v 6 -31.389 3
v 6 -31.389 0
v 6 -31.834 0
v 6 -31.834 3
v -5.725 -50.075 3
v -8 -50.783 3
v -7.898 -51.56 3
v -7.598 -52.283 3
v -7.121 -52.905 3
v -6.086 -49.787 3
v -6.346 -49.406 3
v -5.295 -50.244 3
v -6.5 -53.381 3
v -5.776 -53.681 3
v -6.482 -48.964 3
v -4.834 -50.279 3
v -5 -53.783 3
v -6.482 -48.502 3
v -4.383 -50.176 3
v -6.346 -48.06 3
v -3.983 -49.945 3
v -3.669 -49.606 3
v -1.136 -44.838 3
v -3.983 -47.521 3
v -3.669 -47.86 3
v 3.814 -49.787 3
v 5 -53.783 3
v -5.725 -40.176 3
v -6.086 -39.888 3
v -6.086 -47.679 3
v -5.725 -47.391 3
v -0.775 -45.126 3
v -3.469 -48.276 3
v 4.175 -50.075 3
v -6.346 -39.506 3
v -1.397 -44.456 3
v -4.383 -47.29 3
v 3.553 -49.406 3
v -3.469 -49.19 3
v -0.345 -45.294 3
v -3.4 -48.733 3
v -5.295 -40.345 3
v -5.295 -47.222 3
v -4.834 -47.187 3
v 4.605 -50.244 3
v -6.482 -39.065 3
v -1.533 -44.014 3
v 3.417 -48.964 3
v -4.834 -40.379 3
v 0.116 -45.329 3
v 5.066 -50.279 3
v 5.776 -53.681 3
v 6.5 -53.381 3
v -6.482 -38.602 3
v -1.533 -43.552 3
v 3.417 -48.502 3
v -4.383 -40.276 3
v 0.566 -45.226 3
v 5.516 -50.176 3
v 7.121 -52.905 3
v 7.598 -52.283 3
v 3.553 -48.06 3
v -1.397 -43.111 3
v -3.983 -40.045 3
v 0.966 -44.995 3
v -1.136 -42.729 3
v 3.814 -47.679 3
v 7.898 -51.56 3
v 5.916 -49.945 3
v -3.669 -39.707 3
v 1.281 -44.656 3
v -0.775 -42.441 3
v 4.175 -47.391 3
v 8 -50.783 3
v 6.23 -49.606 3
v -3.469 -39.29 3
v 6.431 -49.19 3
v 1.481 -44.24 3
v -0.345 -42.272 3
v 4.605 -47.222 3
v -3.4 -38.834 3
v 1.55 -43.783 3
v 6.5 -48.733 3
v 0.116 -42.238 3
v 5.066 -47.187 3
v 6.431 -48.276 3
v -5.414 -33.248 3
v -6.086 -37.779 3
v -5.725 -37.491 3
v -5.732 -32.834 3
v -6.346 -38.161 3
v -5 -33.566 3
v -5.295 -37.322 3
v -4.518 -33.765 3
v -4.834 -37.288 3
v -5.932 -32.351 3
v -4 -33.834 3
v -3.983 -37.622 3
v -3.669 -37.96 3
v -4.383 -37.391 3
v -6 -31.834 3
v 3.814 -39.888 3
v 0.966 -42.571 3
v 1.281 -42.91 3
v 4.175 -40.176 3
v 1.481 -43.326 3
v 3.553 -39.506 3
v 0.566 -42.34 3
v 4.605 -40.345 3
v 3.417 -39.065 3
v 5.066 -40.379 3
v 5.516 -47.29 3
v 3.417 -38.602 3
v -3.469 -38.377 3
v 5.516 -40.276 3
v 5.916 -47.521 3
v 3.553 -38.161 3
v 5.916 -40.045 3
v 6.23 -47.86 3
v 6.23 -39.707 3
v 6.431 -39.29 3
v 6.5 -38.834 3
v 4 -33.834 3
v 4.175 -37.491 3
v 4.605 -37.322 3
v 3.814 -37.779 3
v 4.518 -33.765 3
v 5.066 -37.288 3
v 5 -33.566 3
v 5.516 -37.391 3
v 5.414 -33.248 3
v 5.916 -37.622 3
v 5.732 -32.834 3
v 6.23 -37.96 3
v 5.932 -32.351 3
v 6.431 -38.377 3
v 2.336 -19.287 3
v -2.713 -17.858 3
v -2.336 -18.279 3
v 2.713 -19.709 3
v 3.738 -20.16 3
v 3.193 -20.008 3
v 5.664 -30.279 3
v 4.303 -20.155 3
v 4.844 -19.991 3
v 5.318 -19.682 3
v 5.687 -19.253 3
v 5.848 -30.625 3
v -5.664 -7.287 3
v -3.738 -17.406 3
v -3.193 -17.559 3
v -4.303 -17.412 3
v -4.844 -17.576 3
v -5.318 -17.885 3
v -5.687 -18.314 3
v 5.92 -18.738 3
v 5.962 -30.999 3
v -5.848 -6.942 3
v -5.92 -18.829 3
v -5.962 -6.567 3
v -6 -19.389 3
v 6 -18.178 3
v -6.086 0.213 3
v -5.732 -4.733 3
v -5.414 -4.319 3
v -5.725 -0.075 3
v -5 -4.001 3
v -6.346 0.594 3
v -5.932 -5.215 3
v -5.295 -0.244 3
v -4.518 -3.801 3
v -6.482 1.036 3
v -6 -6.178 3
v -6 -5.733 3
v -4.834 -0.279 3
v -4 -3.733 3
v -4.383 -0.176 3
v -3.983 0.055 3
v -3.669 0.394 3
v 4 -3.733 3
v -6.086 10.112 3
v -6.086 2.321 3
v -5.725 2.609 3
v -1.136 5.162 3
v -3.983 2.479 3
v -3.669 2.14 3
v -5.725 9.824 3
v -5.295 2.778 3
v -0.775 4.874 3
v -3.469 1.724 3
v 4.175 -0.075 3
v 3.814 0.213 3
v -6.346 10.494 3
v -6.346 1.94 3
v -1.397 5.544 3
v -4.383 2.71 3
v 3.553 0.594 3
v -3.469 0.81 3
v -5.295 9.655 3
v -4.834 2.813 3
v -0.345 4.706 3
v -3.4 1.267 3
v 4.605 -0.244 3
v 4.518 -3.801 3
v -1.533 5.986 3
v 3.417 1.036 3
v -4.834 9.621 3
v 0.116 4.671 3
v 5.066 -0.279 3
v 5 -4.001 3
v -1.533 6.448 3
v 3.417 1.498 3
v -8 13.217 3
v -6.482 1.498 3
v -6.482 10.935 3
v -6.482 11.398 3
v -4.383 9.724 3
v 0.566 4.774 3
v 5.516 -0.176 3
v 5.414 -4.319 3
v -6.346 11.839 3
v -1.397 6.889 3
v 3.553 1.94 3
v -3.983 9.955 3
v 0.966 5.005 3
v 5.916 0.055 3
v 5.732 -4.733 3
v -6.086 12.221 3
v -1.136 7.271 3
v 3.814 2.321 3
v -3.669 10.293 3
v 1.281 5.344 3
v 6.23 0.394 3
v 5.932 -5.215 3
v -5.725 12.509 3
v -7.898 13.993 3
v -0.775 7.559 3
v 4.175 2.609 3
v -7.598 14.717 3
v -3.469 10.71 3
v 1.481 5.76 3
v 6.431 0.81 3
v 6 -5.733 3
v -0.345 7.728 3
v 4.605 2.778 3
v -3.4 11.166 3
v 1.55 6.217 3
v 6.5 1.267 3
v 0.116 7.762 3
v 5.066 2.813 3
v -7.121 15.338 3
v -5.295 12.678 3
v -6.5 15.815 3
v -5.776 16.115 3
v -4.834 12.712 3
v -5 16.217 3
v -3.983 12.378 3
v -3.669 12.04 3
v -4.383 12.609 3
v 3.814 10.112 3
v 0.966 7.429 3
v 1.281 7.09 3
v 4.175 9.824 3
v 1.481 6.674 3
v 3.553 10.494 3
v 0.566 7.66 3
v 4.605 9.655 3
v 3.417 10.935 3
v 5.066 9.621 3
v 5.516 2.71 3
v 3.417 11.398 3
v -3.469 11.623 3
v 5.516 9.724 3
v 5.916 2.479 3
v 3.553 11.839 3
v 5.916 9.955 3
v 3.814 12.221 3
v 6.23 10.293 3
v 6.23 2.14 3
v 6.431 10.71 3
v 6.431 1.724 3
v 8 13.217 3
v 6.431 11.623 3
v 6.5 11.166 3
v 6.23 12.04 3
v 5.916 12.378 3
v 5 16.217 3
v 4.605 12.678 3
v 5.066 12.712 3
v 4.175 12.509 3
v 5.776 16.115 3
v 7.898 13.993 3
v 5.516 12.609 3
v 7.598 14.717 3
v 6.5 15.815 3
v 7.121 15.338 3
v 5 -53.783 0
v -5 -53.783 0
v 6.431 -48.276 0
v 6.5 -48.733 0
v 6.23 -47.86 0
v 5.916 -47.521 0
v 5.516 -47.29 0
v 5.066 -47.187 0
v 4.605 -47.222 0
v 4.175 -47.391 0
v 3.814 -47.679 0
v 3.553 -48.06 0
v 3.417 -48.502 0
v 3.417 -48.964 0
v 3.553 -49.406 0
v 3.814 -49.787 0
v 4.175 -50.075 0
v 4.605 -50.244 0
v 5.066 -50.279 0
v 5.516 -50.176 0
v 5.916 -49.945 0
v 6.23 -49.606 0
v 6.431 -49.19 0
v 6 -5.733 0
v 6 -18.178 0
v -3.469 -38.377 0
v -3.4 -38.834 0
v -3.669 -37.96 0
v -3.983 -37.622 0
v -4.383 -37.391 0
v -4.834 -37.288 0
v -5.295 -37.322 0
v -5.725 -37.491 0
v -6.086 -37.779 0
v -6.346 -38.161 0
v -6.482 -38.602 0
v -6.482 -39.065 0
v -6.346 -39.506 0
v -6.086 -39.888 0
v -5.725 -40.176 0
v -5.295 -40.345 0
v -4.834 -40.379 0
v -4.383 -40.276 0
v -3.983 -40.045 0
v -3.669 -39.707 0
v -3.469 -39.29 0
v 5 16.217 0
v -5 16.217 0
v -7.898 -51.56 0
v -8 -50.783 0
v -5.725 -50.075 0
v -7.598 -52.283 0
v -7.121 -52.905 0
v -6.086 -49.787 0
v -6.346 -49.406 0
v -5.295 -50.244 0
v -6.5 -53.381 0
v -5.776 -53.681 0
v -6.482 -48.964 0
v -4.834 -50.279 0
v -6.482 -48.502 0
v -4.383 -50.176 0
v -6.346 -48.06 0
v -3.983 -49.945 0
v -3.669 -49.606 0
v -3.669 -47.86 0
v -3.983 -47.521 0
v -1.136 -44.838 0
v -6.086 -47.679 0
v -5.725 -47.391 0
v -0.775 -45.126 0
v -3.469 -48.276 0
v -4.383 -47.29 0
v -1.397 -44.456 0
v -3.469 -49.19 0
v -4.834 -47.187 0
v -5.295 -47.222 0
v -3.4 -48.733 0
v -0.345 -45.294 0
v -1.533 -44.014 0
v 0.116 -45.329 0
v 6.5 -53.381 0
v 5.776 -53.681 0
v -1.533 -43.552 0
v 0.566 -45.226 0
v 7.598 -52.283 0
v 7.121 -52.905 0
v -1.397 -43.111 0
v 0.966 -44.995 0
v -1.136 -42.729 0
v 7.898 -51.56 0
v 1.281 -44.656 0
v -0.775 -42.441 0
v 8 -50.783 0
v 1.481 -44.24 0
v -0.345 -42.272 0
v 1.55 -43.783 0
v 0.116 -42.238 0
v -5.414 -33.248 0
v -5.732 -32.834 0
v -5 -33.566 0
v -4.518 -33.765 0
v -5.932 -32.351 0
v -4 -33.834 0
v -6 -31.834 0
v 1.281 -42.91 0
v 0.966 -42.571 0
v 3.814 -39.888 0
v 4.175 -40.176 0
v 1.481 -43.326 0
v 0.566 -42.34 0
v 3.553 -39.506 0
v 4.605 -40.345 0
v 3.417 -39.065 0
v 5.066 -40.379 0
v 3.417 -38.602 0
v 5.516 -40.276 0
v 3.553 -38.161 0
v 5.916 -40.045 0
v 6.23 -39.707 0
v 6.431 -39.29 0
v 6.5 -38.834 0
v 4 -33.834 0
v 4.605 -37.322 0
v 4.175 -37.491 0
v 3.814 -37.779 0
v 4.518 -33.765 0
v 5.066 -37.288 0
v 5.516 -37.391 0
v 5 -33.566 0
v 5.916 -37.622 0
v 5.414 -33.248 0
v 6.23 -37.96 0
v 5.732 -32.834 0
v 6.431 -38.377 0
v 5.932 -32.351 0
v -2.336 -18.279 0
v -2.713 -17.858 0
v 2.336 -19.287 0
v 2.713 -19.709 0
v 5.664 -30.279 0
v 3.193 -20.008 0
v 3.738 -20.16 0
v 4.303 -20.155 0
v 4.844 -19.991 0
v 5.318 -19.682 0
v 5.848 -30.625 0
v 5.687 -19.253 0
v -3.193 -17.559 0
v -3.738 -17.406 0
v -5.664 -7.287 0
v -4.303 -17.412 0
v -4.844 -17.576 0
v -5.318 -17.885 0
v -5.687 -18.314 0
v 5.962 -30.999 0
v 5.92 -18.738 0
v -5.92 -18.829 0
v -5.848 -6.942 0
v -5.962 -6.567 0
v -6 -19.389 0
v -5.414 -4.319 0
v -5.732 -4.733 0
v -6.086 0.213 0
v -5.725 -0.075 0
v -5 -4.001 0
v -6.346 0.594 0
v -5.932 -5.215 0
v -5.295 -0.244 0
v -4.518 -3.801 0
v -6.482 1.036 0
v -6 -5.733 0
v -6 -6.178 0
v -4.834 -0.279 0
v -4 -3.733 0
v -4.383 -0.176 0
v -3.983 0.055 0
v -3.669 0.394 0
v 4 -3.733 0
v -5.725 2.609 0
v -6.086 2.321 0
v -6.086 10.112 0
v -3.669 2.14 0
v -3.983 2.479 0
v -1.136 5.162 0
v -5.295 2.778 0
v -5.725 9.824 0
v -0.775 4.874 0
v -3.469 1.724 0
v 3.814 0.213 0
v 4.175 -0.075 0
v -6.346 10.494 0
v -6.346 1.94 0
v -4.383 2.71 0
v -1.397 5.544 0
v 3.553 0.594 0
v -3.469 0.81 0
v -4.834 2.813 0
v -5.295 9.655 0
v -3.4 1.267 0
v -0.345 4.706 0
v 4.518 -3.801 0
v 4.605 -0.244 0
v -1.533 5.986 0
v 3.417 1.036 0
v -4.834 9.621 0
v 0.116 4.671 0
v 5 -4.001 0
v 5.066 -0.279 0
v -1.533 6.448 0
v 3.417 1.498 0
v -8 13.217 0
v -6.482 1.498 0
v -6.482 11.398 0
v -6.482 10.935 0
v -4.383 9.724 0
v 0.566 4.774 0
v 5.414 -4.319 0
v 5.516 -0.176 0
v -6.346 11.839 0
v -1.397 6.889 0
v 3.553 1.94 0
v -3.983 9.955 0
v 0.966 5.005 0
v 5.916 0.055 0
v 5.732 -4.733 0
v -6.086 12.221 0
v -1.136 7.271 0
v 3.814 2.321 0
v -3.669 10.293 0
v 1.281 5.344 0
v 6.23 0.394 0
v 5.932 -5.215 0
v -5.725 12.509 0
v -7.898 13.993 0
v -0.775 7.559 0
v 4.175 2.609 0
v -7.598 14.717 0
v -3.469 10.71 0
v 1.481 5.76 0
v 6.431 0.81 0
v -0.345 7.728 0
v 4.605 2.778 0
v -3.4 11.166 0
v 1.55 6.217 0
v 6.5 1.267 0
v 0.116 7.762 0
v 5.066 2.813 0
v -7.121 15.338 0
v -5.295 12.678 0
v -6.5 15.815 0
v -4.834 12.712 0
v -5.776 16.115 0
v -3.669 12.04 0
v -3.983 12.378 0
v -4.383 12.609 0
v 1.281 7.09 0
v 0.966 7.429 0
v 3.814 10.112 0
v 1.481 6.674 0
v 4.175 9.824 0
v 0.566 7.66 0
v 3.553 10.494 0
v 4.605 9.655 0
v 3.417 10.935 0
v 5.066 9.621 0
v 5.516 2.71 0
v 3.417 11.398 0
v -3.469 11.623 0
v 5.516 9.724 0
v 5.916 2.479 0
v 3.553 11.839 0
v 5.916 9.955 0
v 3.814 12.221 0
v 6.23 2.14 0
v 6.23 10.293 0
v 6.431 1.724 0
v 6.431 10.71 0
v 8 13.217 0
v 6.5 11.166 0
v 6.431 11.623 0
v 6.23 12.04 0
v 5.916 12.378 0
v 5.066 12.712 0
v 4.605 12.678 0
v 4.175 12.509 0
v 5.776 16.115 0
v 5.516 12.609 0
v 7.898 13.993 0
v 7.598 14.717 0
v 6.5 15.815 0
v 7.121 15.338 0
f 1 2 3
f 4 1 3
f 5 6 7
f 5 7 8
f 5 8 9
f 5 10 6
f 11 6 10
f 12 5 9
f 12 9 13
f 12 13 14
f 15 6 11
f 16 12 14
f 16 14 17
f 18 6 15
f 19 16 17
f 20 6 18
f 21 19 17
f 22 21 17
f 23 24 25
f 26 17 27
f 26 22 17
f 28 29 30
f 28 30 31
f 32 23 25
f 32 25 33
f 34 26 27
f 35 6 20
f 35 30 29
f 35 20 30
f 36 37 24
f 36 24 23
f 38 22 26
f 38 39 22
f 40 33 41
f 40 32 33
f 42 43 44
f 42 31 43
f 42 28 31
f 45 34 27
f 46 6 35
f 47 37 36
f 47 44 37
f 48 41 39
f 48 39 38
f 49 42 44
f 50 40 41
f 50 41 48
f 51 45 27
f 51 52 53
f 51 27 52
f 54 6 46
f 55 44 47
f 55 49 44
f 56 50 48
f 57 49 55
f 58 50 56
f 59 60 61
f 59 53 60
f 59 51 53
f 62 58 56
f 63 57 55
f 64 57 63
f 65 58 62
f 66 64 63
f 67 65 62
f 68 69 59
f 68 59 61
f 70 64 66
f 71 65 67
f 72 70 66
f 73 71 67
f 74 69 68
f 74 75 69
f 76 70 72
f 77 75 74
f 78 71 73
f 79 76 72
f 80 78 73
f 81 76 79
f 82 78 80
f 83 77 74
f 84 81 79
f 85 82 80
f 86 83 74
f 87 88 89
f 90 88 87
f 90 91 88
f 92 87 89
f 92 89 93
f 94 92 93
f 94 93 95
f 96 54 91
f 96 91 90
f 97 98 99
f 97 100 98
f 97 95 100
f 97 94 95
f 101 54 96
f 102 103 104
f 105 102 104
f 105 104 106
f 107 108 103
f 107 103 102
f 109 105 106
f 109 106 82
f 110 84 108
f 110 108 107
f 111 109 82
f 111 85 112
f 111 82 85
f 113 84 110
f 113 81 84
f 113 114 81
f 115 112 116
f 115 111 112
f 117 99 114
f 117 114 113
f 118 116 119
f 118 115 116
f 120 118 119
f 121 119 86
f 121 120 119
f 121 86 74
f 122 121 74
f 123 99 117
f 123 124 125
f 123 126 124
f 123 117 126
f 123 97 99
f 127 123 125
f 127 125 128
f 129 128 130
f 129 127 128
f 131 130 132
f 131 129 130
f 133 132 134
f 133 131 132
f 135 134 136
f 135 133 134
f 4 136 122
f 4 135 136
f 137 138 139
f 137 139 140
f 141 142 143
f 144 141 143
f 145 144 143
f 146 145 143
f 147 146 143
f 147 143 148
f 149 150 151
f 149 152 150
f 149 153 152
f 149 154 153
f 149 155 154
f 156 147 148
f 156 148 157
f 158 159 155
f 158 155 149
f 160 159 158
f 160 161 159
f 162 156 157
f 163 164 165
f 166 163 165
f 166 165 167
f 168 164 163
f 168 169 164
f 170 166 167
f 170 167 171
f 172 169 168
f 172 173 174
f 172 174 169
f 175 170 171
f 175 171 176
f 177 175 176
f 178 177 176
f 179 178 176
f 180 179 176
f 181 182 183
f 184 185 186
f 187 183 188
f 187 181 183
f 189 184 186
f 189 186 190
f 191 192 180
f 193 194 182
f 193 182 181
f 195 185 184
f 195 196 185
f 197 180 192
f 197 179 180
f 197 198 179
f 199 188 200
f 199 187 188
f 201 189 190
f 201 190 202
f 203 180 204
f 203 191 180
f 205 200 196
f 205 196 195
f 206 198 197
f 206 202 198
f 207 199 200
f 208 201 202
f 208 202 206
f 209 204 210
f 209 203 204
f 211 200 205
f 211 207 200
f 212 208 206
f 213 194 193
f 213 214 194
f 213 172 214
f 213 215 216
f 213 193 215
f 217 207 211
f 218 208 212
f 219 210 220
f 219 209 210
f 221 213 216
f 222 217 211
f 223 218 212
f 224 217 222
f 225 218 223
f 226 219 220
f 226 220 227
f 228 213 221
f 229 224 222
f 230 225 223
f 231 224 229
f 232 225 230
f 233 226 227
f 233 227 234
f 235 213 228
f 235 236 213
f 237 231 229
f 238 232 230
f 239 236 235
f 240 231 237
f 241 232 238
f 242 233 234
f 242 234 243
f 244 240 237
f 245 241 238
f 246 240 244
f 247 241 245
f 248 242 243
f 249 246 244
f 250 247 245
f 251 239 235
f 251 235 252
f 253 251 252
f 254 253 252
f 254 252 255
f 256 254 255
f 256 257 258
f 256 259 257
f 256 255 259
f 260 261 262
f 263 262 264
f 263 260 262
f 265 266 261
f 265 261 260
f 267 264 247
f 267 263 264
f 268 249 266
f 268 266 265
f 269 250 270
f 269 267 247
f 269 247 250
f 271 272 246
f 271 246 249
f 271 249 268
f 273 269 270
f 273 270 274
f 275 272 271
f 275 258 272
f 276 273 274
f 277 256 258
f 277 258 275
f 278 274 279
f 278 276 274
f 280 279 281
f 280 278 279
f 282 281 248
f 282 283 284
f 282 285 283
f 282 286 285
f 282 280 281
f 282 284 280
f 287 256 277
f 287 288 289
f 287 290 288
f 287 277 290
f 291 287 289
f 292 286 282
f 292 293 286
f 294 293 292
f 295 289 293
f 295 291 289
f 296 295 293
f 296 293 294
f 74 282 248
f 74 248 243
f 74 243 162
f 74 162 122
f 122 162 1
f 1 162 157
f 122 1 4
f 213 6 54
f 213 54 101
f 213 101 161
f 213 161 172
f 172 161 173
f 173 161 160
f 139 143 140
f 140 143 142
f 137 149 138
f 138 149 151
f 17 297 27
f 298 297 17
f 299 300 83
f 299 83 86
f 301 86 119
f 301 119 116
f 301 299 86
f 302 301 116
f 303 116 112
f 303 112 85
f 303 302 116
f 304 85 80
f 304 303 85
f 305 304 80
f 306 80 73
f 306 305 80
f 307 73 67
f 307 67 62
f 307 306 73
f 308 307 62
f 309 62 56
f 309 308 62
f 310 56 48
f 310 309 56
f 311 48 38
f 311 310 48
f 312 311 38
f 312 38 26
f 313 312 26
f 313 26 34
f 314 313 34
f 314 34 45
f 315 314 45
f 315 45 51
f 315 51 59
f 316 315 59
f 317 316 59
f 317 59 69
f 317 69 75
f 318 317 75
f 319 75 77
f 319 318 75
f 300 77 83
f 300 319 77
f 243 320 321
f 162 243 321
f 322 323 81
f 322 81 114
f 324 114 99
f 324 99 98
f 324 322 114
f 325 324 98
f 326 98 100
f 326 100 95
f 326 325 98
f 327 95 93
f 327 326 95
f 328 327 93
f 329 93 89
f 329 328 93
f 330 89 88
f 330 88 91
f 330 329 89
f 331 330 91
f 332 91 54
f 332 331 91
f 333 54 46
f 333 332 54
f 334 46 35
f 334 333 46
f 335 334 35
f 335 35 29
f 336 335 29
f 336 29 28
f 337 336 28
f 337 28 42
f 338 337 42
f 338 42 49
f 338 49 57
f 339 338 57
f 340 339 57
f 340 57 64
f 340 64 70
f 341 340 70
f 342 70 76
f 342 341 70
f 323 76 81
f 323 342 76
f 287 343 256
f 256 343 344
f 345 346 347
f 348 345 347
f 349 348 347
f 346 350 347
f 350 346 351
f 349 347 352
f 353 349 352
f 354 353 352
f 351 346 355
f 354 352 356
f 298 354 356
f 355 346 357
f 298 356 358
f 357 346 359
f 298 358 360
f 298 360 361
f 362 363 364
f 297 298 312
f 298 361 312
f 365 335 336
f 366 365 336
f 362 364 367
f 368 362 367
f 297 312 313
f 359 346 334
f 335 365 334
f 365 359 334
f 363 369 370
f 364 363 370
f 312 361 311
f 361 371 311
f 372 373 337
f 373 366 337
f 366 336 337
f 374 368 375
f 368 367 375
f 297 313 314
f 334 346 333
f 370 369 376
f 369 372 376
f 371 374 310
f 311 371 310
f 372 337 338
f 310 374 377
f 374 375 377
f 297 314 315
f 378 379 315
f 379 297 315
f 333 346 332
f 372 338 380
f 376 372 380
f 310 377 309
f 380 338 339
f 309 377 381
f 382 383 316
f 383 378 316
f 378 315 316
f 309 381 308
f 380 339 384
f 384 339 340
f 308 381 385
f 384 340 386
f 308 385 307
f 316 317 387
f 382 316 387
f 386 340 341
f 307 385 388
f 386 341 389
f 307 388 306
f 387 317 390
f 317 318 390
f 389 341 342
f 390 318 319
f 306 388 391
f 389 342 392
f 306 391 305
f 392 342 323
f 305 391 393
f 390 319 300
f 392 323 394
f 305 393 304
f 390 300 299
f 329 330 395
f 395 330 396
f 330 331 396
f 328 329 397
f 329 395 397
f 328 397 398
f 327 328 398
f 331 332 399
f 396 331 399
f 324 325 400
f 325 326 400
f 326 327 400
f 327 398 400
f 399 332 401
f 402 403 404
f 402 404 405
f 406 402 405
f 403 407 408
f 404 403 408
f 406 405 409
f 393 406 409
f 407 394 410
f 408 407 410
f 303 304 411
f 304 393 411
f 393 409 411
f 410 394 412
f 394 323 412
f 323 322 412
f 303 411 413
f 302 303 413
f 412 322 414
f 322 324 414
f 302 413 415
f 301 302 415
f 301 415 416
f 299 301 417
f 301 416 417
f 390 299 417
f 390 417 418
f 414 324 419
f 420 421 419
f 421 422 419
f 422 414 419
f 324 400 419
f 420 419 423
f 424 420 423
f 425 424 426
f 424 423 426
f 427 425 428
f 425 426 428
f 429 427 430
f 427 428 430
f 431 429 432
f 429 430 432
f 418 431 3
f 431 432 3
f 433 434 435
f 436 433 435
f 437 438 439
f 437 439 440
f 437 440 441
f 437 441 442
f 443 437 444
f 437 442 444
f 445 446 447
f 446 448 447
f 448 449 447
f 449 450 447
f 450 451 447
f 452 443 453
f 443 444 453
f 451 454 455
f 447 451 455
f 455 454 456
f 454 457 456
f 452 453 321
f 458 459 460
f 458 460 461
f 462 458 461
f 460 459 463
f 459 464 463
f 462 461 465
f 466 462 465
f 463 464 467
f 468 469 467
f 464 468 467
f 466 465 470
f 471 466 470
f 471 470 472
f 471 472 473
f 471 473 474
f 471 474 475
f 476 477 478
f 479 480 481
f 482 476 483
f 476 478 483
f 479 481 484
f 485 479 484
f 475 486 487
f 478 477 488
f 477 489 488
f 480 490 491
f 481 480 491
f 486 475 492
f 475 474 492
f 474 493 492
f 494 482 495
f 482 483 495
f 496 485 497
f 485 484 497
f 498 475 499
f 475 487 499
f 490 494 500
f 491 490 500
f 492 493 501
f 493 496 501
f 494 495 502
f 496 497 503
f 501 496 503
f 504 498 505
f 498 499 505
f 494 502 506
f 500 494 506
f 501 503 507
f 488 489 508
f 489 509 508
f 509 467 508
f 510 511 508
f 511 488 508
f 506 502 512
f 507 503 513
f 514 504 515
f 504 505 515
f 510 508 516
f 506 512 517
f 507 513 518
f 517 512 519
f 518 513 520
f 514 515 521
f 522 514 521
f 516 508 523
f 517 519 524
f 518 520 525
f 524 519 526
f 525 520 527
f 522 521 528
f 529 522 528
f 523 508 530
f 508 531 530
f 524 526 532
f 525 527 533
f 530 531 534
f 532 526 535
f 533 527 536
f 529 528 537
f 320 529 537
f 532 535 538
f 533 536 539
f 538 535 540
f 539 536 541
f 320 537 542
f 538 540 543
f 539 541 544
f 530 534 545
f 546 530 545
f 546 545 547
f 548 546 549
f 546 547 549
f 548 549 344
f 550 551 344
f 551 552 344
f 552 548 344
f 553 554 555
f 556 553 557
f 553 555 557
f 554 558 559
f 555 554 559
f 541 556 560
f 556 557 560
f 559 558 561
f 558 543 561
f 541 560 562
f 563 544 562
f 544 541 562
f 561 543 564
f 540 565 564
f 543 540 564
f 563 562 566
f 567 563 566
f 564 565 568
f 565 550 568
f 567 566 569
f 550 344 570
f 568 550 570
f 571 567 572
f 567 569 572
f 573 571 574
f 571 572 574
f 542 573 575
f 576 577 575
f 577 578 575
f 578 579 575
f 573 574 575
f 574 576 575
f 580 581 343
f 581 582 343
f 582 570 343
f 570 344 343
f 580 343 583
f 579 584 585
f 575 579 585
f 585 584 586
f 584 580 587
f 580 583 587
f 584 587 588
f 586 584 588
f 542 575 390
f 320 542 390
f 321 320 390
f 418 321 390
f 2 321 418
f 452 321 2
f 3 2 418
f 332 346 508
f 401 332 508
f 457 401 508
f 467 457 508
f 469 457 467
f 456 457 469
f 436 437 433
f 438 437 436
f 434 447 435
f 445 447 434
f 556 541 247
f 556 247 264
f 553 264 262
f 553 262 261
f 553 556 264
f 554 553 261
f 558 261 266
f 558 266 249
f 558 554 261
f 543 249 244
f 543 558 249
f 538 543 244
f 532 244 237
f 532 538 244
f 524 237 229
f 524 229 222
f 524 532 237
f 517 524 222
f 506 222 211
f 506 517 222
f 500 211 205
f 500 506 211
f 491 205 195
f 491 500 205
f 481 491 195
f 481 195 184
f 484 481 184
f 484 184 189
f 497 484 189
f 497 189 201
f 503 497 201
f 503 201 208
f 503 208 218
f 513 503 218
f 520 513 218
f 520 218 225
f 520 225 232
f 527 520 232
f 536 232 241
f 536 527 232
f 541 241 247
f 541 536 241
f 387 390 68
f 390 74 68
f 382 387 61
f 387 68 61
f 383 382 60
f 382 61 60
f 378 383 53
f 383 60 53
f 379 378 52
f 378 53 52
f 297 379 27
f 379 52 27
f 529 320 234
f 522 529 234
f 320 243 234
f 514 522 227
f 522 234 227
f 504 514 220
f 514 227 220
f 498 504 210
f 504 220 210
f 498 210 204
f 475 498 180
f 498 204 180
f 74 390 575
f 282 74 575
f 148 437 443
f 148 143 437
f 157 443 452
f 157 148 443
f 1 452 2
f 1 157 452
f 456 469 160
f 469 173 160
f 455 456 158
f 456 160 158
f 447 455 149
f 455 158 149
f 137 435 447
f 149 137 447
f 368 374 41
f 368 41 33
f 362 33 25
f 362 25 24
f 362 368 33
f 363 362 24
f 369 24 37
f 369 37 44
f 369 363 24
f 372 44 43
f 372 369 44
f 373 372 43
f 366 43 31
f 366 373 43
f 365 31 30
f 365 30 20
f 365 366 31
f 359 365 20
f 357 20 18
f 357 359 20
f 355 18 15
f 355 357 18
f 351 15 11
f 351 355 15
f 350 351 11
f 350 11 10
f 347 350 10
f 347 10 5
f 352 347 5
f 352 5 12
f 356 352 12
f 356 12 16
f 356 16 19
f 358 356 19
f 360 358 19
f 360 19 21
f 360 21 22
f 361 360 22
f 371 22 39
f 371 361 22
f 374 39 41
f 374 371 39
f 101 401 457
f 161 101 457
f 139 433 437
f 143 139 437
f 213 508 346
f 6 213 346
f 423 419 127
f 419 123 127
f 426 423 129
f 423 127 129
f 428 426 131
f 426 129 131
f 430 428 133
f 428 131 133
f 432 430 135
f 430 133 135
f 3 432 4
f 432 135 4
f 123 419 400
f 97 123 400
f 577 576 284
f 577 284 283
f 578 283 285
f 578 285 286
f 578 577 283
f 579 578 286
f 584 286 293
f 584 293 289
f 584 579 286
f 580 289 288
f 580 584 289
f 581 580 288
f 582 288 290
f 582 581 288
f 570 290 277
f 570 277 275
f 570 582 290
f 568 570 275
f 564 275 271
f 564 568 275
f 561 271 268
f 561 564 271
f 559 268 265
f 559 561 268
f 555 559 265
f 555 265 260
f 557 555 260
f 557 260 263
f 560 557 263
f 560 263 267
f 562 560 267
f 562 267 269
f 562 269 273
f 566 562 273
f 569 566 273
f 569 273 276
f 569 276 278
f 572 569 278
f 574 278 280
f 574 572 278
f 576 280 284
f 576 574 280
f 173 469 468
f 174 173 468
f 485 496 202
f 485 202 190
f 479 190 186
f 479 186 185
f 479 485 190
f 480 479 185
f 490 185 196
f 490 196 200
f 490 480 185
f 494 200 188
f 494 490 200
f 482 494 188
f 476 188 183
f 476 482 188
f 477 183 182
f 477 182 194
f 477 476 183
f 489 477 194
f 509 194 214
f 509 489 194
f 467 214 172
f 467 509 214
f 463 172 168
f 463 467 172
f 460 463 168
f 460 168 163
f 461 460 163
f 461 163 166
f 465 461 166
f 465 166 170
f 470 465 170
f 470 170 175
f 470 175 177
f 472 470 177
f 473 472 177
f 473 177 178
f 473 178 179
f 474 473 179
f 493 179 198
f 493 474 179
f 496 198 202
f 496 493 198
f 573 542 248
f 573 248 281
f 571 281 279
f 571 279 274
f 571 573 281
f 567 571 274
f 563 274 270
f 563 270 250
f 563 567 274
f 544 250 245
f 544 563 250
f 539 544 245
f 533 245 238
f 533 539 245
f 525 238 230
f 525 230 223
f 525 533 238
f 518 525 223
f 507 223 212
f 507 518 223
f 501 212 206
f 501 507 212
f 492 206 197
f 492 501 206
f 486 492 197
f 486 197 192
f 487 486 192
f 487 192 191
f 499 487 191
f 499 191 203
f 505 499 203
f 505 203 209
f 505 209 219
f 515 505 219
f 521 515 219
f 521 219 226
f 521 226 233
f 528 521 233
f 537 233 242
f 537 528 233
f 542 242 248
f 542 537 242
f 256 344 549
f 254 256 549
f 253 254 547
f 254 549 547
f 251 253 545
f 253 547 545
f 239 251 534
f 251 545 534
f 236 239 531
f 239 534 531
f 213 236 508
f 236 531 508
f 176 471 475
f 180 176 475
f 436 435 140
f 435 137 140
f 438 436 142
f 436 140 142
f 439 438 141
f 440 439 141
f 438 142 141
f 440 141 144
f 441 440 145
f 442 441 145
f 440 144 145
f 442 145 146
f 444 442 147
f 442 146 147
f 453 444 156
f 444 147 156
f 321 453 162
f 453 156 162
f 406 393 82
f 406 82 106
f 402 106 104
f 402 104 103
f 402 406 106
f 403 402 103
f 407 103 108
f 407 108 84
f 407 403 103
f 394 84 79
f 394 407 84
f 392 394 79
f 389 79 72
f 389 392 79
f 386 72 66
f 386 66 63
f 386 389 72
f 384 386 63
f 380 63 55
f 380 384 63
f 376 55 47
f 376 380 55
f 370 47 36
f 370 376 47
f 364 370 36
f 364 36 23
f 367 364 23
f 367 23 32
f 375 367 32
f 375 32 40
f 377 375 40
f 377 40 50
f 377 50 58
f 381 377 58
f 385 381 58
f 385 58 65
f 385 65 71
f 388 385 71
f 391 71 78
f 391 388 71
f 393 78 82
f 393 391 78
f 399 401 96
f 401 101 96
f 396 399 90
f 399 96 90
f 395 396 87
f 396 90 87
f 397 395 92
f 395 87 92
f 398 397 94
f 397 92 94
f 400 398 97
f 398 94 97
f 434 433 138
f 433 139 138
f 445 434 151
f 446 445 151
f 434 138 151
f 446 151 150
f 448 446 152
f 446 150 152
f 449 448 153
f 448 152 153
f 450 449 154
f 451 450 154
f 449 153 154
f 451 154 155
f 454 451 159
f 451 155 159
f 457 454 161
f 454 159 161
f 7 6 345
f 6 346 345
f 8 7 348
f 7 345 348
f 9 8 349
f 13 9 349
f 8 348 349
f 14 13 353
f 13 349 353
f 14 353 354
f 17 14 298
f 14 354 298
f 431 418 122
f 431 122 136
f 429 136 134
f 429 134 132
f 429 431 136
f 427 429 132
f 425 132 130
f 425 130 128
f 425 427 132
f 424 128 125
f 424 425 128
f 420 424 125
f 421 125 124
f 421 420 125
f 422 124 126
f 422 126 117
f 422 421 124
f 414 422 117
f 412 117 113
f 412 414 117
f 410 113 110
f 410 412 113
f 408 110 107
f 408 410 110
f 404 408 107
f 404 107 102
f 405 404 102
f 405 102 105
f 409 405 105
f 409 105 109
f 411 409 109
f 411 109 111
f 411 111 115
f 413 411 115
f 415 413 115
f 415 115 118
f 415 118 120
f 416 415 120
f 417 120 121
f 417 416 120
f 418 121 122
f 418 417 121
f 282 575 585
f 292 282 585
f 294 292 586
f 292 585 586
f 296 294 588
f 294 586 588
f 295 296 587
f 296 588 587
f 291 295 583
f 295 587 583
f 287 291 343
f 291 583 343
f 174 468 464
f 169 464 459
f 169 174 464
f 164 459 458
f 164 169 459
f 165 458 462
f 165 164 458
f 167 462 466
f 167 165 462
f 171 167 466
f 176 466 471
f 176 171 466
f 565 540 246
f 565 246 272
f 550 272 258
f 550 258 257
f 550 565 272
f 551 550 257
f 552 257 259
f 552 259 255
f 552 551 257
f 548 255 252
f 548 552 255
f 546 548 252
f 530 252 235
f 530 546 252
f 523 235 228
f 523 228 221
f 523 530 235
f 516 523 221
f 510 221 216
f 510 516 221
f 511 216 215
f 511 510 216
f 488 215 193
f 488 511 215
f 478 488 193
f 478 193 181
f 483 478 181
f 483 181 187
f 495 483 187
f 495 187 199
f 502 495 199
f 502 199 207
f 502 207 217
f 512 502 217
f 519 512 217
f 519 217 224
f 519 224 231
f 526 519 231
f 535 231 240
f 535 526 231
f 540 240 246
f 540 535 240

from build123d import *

# Parameters (mm, degrees)
SKETCH_1_R          = 1.55
EXTRUDE_1_DEPTH     = 3
SKETCH_2_W          = 30.67898901
SKETCH_2_H          = 20.291672983
CUT_EXTRUDE_1_DEPTH = 10
SKETCH_3_R          = 1
CUT_EXTRUDE_2_DEPTH = 20
SKETCH_4_W          = 23.960943262
SKETCH_4_H          = 52.328724607
CUT_EXTRUDE_3_DEPTH = 10
FILLET_1_R          = 3
CUT_EXTRUDE_4_DEPTH = 55.457683839
FILLET_2_R          = 2


with BuildPart() as part:
    # 草图1 → 凸台-拉伸1 (new body)
    with BuildSketch(Plane.XY):
        with BuildLine():
            Line((5, 16.216737463), (-5, 16.216737463))
            ThreePointArc((-5, 16.216737463), (-7.121320344, 15.338057806), (-8, 13.216737463))
            Line((-8, 13.216737463), (-8, -66.783262537))
            Line((-8, -66.783262537), (-4, -108.783262537))
            Line((-4, -108.783262537), (4, -108.783262537))
            Line((4, -108.783262537), (8, -66.783262537))
            Line((8, -66.783262537), (8, 13.216737463))
            ThreePointArc((8, 13.216737463), (7.121320344, 15.338057806), (5, 16.216737463))
        make_face()
        with Locations((-4.949747468, 11.166484931)):
            Circle(SKETCH_1_R, mode=Mode.SUBTRACT)
        with Locations((4.949747468, 11.166484931)):
            Circle(SKETCH_1_R, mode=Mode.SUBTRACT)
        with Locations((4.949747468, 1.266989995)):
            Circle(SKETCH_1_R, mode=Mode.SUBTRACT)
        with Locations((-4.949747468, 1.266989995)):
            Circle(SKETCH_1_R, mode=Mode.SUBTRACT)
        with Locations((0, -43.783262537)):
            Circle(SKETCH_1_R, mode=Mode.SUBTRACT)
        with Locations((4.949747468, -38.833515069)):
            Circle(SKETCH_1_R, mode=Mode.SUBTRACT)
        with Locations((-4.949747468, -38.833515069)):
            Circle(SKETCH_1_R, mode=Mode.SUBTRACT)
        with Locations((4.949747468, -48.733010005)):
            Circle(SKETCH_1_R, mode=Mode.SUBTRACT)
        with Locations((-4.949747468, -48.733010005)):
            Circle(SKETCH_1_R, mode=Mode.SUBTRACT)
        with Locations((0, 6.216737463)):
            Circle(SKETCH_1_R, mode=Mode.SUBTRACT)
    extrude(amount=EXTRUDE_1_DEPTH)

    # 草图2 → 切除-拉伸1 (cut)
    with BuildSketch(Plane(origin=(0, 0, 0), x_dir=(-1, 0, 0), z_dir=(0, 0, -1))):
        with Locations((1.230440634, -108.929099029)):
            Rectangle(SKETCH_2_W, SKETCH_2_H)
    extrude(amount=-CUT_EXTRUDE_1_DEPTH, mode=Mode.SUBTRACT)

    # 草图3 → 切除-拉伸2 (cut)
    with BuildSketch(Plane(origin=(0, 0, 0), x_dir=(-1, 0, 0), z_dir=(0, 0, -1))):
        with Locations((0, -83.783262537)):
            Circle(SKETCH_3_R)
        with Locations((0, -90.783262537)):
            Circle(SKETCH_3_R)
        with Locations((0, -73.783262537)):
            Circle(SKETCH_3_R)
    extrude(amount=-CUT_EXTRUDE_2_DEPTH, mode=Mode.SUBTRACT)

    # 草图4 → 切除-拉伸3 (cut)
    with BuildSketch(Plane(origin=(0, 0, 0), x_dir=(-1, 0, 0), z_dir=(0, 0, -1))):
        with Locations((3.980471631, -79.947624841)):
            Rectangle(SKETCH_4_W, SKETCH_4_H)
    extrude(amount=-CUT_EXTRUDE_3_DEPTH, mode=Mode.SUBTRACT)

    # 圆角1
    fillet_1_edges = [part.edges().sort_by_distance(p)[0] for p in [
        (8, -53.783262537, 1.5),
        (-8, -53.783262537, 1.5),
    ]]
    fillet(fillet_1_edges, radius=FILLET_1_R)

    # 草图5 → 切除-拉伸4 (cut, through all)
    with BuildSketch(Plane(origin=(0, 0, 0), x_dir=(-1, 0, 0), z_dir=(0, 0, -1))):
        Polygon((2, -18.783262537), (-6, -30.783262537), (-6, -33.833515069), (6, -33.833515069), (6, -18.783262537), align=None)
        Polygon((6, -3.733010005), (-6, -3.733010005), (-6, -18.783262537), (-2, -18.783262537), (6, -6.783262537), align=None)
        Polygon((-2, -18.783262537), (-6, -18.783262537), (-6, -24.783262537), align=None)
        Polygon((6, -18.783262537), (6, -12.783262537), (2, -18.783262537), align=None)
    extrude(amount=-CUT_EXTRUDE_4_DEPTH, mode=Mode.SUBTRACT)

    # 圆角2
    fillet_2_edges = [part.edges().sort_by_distance(p)[0] for p in [
        (-6, -12.783262537, 1.5),
        (-6, -33.833515069, 1.5),
        (6, -33.833515069, 1.5),
        (6, -30.783262537, 1.5),
        (6, -24.783262537, 1.5),
        (6, -3.733010005, 1.5),
        (-6, -3.733010005, 1.5),
        (-6, -6.783262537, 1.5),
    ]]
    fillet(fillet_2_edges, radius=FILLET_2_R)


solid = part.part
